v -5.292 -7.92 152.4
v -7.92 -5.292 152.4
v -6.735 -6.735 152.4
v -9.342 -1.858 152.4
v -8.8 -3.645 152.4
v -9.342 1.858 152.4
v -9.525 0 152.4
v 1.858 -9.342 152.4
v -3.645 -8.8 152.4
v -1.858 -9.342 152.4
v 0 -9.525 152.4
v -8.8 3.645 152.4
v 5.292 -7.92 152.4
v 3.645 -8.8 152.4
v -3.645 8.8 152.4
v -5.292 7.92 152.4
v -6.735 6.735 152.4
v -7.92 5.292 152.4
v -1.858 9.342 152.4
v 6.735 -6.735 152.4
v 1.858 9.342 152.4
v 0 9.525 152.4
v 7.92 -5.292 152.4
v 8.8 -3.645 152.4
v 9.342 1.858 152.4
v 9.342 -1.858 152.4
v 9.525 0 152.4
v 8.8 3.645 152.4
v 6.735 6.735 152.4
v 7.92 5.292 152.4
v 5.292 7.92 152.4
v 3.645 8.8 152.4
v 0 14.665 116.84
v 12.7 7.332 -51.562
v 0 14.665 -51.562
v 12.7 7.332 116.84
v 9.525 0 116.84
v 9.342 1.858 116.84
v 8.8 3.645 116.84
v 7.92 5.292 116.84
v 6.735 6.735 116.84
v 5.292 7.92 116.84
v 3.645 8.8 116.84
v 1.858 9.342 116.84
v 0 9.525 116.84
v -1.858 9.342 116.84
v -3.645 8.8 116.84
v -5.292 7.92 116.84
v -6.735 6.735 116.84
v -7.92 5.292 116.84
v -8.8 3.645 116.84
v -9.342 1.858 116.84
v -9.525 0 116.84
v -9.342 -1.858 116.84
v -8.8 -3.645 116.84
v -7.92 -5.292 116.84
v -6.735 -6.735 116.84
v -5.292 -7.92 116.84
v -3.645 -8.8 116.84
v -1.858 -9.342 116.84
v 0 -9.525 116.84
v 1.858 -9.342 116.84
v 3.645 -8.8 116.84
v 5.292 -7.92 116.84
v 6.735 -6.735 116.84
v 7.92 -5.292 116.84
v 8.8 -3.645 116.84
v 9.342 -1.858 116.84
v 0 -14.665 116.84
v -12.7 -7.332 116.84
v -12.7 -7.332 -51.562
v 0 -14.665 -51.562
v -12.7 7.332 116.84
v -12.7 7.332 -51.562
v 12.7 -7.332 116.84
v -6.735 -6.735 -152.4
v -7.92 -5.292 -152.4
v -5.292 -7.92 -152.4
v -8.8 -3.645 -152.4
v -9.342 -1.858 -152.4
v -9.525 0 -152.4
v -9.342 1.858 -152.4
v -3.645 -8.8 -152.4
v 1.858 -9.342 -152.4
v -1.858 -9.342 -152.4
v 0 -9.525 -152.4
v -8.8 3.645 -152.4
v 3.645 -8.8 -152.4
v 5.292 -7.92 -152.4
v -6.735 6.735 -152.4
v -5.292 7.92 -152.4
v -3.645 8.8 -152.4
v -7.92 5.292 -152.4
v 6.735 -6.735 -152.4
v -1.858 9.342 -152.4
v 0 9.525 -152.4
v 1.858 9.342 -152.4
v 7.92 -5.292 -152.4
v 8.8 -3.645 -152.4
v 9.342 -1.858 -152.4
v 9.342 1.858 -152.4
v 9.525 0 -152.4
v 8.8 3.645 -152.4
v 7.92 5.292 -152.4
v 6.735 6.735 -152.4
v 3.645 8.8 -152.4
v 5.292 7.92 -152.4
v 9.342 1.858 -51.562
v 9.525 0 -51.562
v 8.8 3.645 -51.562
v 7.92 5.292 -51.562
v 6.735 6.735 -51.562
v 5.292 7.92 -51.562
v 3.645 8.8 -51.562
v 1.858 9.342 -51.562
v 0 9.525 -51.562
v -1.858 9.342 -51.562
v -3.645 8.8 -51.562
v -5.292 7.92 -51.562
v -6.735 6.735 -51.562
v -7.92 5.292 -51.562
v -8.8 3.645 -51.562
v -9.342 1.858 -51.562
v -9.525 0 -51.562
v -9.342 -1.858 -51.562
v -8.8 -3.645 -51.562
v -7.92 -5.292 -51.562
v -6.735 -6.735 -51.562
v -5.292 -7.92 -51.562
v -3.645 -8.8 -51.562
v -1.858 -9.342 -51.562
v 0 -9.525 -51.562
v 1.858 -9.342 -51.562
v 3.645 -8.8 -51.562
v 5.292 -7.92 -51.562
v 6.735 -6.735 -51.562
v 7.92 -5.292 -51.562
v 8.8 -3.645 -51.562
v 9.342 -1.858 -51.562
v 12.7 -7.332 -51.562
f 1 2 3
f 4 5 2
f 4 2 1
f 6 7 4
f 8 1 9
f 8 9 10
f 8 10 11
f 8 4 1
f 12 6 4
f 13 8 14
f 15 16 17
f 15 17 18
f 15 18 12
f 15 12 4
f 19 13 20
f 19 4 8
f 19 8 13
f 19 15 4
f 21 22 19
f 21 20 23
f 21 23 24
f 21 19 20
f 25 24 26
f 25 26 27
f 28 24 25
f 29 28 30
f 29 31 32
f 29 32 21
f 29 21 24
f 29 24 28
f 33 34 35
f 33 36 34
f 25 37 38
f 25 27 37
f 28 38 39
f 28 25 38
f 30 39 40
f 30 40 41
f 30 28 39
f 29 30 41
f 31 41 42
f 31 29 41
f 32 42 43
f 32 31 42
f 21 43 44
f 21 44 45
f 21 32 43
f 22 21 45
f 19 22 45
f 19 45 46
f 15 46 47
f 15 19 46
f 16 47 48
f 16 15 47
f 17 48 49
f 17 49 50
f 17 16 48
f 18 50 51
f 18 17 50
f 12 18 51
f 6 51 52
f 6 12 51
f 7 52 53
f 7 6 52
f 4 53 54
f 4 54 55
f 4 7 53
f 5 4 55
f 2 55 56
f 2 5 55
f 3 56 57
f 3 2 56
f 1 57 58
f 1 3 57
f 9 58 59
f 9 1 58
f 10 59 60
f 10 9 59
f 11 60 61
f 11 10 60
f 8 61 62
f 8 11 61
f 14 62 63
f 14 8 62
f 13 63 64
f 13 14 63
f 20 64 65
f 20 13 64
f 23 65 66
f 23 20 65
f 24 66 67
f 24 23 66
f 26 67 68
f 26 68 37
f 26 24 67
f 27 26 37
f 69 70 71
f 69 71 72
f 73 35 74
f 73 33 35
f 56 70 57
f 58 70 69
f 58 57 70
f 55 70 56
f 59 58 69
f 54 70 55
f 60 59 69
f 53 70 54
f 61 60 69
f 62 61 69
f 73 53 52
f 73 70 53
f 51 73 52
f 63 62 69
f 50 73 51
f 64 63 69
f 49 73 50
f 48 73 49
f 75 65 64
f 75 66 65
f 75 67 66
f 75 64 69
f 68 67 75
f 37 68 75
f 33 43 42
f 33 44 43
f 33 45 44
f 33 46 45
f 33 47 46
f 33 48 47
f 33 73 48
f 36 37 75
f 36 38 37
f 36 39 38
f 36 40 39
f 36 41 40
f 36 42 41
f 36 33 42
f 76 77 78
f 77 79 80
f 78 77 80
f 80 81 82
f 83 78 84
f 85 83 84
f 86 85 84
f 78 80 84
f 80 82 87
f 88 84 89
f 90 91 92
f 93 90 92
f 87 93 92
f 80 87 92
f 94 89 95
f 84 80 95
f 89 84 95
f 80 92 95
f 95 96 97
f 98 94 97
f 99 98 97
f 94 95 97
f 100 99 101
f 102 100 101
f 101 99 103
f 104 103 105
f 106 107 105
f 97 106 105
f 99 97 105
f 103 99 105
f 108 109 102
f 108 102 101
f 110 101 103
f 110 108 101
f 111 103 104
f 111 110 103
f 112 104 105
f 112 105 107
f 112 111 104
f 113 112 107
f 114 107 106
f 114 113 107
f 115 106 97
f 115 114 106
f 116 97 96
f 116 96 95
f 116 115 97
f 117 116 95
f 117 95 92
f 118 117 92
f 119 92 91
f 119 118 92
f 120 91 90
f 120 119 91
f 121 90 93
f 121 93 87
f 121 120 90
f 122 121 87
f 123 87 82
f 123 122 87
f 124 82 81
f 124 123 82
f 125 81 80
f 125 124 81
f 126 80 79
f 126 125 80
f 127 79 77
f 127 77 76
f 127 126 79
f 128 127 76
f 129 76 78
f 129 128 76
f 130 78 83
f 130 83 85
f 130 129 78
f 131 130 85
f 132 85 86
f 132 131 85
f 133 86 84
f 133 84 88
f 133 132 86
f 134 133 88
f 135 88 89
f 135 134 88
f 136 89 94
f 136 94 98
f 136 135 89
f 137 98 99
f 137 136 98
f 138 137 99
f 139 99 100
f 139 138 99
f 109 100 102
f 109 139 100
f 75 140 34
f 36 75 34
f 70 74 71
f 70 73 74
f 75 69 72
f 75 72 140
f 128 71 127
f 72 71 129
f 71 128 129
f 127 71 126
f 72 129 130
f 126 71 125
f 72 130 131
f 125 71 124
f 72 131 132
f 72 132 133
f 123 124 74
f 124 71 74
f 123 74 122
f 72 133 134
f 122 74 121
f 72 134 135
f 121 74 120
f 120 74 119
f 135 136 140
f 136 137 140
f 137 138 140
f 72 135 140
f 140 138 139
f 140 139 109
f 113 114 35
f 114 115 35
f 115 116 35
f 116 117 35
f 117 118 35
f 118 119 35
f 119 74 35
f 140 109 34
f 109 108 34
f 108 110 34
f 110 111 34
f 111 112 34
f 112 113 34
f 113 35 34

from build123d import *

# Parameters (mm, degrees)
BOSS_EXTRUDE1_DEPTH      = 116.84
BOSS_EXTRUDE1_DEPTH_BACK = 51.562
SKETCH1_3_R              = 9.525
BOSS_EXTRUDE2_DEPTH      = 152.4


with BuildPart() as part:
    # Sketch1 → Boss-Extrude1 (new, two sides: drawn at the far end of the back side and taken through both)
    with BuildSketch(Plane.XY.offset(-BOSS_EXTRUDE1_DEPTH_BACK)):
        Polygon((-12.7, -7.332348419), (0, -14.664696837), (12.7, -7.332348419), (12.7, 7.332348419), (0, 14.664696837), (-12.7, 7.332348419), align=None)
    extrude(amount=BOSS_EXTRUDE1_DEPTH + BOSS_EXTRUDE1_DEPTH_BACK)

    # Sketch1<3> → Boss-Extrude2 (add, symmetric)
    with BuildSketch(Plane.XY):
        Circle(SKETCH1_3_R)
    extrude(amount=BOSS_EXTRUDE2_DEPTH, both=True)


solid = part.part
